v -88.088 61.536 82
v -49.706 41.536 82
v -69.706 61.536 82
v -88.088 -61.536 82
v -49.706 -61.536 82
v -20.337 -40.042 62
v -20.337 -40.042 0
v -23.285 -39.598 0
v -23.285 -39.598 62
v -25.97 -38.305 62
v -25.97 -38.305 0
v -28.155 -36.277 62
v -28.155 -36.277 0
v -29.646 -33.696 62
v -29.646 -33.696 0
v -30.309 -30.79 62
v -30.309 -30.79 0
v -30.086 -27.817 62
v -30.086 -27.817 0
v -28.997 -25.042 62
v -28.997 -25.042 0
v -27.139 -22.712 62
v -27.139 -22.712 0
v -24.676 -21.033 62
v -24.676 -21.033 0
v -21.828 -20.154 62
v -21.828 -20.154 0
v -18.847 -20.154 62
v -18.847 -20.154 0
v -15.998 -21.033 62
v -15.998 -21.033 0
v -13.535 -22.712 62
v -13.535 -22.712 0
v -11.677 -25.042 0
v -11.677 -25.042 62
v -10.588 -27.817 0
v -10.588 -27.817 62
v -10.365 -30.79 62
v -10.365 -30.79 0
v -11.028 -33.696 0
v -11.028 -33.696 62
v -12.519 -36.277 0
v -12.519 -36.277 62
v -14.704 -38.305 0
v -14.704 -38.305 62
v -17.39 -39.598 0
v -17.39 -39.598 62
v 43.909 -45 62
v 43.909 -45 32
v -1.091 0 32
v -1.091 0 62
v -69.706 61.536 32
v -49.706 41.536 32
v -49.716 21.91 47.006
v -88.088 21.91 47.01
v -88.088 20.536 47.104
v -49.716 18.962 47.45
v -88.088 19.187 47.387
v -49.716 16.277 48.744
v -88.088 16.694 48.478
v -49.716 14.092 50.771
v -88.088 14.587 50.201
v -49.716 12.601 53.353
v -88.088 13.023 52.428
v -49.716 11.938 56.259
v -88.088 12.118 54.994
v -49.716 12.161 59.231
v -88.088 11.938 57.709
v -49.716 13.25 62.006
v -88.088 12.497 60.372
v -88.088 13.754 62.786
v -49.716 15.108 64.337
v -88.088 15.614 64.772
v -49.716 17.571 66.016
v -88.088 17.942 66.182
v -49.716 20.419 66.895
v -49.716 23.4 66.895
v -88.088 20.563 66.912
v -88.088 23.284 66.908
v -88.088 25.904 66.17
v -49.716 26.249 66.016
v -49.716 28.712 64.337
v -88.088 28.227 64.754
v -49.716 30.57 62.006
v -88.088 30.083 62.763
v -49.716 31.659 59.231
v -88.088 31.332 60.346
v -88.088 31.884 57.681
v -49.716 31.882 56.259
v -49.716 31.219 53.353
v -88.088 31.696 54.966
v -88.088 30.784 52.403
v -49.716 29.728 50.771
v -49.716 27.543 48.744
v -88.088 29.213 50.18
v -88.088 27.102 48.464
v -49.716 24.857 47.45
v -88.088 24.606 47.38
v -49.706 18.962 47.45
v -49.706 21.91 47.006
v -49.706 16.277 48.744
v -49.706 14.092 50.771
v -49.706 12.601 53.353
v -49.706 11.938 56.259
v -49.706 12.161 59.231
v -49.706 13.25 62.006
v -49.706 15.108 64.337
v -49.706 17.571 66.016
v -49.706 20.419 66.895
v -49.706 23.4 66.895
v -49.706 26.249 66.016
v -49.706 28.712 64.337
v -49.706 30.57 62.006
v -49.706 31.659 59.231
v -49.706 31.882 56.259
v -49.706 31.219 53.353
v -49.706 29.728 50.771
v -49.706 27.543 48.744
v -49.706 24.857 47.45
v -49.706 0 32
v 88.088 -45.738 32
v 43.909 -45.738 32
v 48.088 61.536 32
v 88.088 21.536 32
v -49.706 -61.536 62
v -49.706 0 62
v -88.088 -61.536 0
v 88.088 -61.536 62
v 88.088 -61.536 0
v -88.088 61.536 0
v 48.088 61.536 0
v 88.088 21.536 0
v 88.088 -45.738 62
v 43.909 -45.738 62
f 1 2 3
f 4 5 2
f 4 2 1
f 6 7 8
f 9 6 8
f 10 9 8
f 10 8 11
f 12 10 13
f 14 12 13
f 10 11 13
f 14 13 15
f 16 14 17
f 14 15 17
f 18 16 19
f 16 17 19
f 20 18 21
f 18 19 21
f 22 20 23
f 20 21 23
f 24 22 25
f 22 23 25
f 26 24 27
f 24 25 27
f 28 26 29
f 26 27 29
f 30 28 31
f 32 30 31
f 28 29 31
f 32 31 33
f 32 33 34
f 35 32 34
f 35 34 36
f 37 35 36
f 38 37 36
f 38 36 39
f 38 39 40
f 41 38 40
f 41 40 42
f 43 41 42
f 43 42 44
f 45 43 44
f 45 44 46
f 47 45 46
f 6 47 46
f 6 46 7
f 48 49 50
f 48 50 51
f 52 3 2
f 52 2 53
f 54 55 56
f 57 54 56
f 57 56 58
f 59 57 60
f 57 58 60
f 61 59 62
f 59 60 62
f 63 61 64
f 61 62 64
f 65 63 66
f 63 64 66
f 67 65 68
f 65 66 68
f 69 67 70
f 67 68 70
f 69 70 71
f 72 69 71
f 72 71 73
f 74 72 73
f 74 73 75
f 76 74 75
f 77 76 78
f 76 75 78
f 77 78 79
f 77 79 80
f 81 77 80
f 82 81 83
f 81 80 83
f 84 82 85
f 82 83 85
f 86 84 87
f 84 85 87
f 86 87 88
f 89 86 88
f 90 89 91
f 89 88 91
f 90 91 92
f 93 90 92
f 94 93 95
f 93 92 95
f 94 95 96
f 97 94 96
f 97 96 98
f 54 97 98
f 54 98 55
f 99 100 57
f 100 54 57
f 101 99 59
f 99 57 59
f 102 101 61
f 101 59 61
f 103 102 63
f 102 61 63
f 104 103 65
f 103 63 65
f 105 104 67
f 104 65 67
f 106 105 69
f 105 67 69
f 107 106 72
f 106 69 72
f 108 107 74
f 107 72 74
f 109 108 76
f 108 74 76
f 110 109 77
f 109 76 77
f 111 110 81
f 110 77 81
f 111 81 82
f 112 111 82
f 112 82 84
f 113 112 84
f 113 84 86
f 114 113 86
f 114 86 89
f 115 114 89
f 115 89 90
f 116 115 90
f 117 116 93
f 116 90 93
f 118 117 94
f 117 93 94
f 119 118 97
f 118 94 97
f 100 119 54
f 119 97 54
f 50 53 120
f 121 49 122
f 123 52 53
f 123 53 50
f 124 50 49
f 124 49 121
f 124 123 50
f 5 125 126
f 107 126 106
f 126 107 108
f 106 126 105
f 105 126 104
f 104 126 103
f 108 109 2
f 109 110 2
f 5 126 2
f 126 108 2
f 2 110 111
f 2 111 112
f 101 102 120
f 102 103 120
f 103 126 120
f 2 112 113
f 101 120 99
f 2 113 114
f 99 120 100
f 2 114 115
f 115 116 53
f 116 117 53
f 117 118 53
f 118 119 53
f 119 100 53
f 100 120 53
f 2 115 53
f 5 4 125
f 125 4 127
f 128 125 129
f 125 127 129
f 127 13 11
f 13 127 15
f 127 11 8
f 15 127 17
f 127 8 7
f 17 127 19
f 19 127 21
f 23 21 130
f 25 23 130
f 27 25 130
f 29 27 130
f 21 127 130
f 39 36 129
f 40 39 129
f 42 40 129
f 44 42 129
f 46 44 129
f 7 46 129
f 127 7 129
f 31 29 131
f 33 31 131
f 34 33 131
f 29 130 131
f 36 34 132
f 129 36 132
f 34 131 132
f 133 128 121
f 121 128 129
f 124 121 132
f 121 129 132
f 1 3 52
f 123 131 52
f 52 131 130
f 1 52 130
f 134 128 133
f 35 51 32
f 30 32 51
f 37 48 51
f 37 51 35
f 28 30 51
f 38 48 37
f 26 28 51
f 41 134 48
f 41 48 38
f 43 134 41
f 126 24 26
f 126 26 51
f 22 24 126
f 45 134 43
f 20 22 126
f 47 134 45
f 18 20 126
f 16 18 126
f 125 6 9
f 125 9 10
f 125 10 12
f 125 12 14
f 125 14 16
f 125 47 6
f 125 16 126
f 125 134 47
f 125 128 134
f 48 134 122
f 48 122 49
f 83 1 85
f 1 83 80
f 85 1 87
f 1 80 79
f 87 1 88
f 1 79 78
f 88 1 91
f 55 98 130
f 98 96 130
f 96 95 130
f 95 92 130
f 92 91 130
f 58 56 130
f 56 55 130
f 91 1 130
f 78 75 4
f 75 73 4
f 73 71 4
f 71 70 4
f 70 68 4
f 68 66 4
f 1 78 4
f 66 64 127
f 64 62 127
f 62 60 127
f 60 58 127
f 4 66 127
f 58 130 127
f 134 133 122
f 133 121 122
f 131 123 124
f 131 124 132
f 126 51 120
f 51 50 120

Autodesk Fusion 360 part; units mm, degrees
sketch "Sketch1" plane through (0, 0, 0) normal (0, 0, 1) x (1, 0, 0)
  line L0 (88.0885, 61.5355) -> (-88.0885, 61.5355)
  line L1 (-88.0885, 61.5355) -> (-88.0885, -61.5355)
  line L2 (-88.0885, -61.5355) -> (88.0885, -61.5355)
  line L3 (88.0885, -61.5355) -> (88.0885, 61.5355)
  line L4 (88.0885, 61.5355) -> (-88.0885, -61.5355) construction
  line L5 (-88.0885, 61.5355) -> (88.0885, -61.5355) construction
extrude "Extrude1" add sketch "Sketch1" along normal blind 32
chamfer "Chamfer1" distance 40 angle 45 1 edges at (88.0885, 61.5355, 16)
sketch "Sketch2" plane through (0, 0, 32) normal (0, 0, 1) x (-1, 0, 0)
  line L0 (-88.0885, -21.5355) -> (-48.0885, -61.5355)
  line L1 (-48.0885, -61.5355) -> (88.0885, -61.5355)
  line L2 (88.0885, -61.5355) -> (88.0885, 61.5355)
  line L3 (88.0885, 61.5355) -> (-88.0885, 61.5355)
  line L4 (-88.0885, 61.5355) -> (-88.0885, -21.5355)
  line L5 (88.0885, 61.5355) -> (49.7061, 61.5355)
  line L6 (49.7061, 61.5355) -> (49.7061, -61.5355)
  line L7 (49.7061, -61.5355) -> (88.0885, -61.5355)
  line L8 (88.0885, -61.5355) -> (88.0885, 61.5355)
extrude "Extrude2" add sketch "Sketch2" along normal blind 50 contours L1 L2 L3 L5 L6 L7 L8
sketch "Sketch3" plane through (0, 61.5355, 0) normal (0, 1, 0) x (-1, 0, 0)
  line L0 (-48.0885, 32) -> (-48.0885, 0)
  line L1 (-48.0885, 0) -> (88.0885, 0)
  line L2 (88.0885, 0) -> (88.0885, 82)
  line L3 (88.0885, 82) -> (49.7061, 82)
  line L4 (49.7061, 82) -> (49.7061, 32)
  line L5 (49.7061, 32) -> (-48.0885, 32)
chamfer "Chamfer2" distance 20 angle 45 1 edges at (-49.7061, 61.5355, 57)
sketch "Sketch4" plane through (0, 0, 32) normal (0, 0, 1) x (-1, 0, 0)
  line L0 (49.7061, -41.5355) -> (49.7061, 61.5355)
  line L1 (49.7061, 61.5355) -> (-88.0885, 61.5355)
  line L2 (-88.0885, 61.5355) -> (-88.0885, -21.5355)
  line L3 (-88.0885, -21.5355) -> (-48.0885, -61.5355)
  line L4 (-48.0885, -61.5355) -> (69.7061, -61.5355)
  line L5 (69.7061, -61.5355) -> (49.7061, -41.5355)
  line L6 (49.7061, 61.5355) -> (-43.9087, 61.5355)
  line L7 (-43.9087, 61.5355) -> (-43.9087, 0)
  line L8 (-43.9087, 0) -> (49.7061, 0)
  line L9 (49.7061, 0) -> (49.7061, 61.5355)
extrude "Extrude3" add sketch "Sketch4" along normal blind 30 contours L0 L1 L6 L7 L8 L9
chamfer "Chamfer3" distance 45 angle 45 1 edges at (43.9087, 0, 47)
sketch "Sketch5" plane through (0, 0, 32) normal (0, 0, 1) x (-1, 0, 0)
  line L0 (49.7061, 0) -> (1.0913, 0)
  line L1 (1.0913, 0) -> (-43.9087, 45)
  line L2 (-43.9087, 45) -> (-43.9087, 61.5355)
  line L3 (-43.9087, 61.5355) -> (-88.0885, 61.5355)
  line L4 (-88.0885, 61.5355) -> (-88.0885, -21.5355)
  line L5 (-88.0885, -21.5355) -> (-48.0885, -61.5355)
  line L6 (-48.0885, -61.5355) -> (69.7061, -61.5355)
  line L7 (69.7061, -61.5355) -> (49.7061, -41.5355)
  line L8 (49.7061, -41.5355) -> (49.7061, 0)
  line L9 (-43.9087, 61.5355) -> (-88.0885, 61.5355)
  line L10 (-88.0885, 61.5355) -> (-88.0885, 45.7382)
  line L11 (-88.0885, 45.7382) -> (-43.9087, 45.7382)
  line L12 (-43.9087, 45.7382) -> (-43.9087, 61.5355)
extrude "Extrude4" add sketch "Sketch5" along normal blind 30 contours L2 L3 L4 L9 L10 L11 L12
sketch "Sketch6" plane through (0, 0, 62) normal (0, 0, 1) x (-1, 0, 0)
  line L0 (-43.9087, 45) -> (1.0913, 0)
  line L1 (1.0913, 0) -> (49.7061, 0)
  line L2 (49.7061, 0) -> (49.7061, 61.5355)
  line L3 (49.7061, 61.5355) -> (-88.0885, 61.5355)
  line L4 (-88.0885, 61.5355) -> (-88.0885, 45.7382)
  line L5 (-88.0885, 45.7382) -> (-43.9087, 45.7382)
  line L6 (-43.9087, 45.7382) -> (-43.9087, 45)
hole "Hole1" at (-49.7061, 21.9099, 57.0062) direction (-1, 0, 0) diameter 20 depth 0.01 tip angle 0.01
hole "Hole2" at (-20.3371, -30.0422, 62) direction (0, 0, -1) diameter 20 depth 0.01
hole "Hole3" at (-20.3371, -30.0422, 61.99) direction (0, 0, -1) diameter 20 depth 80
